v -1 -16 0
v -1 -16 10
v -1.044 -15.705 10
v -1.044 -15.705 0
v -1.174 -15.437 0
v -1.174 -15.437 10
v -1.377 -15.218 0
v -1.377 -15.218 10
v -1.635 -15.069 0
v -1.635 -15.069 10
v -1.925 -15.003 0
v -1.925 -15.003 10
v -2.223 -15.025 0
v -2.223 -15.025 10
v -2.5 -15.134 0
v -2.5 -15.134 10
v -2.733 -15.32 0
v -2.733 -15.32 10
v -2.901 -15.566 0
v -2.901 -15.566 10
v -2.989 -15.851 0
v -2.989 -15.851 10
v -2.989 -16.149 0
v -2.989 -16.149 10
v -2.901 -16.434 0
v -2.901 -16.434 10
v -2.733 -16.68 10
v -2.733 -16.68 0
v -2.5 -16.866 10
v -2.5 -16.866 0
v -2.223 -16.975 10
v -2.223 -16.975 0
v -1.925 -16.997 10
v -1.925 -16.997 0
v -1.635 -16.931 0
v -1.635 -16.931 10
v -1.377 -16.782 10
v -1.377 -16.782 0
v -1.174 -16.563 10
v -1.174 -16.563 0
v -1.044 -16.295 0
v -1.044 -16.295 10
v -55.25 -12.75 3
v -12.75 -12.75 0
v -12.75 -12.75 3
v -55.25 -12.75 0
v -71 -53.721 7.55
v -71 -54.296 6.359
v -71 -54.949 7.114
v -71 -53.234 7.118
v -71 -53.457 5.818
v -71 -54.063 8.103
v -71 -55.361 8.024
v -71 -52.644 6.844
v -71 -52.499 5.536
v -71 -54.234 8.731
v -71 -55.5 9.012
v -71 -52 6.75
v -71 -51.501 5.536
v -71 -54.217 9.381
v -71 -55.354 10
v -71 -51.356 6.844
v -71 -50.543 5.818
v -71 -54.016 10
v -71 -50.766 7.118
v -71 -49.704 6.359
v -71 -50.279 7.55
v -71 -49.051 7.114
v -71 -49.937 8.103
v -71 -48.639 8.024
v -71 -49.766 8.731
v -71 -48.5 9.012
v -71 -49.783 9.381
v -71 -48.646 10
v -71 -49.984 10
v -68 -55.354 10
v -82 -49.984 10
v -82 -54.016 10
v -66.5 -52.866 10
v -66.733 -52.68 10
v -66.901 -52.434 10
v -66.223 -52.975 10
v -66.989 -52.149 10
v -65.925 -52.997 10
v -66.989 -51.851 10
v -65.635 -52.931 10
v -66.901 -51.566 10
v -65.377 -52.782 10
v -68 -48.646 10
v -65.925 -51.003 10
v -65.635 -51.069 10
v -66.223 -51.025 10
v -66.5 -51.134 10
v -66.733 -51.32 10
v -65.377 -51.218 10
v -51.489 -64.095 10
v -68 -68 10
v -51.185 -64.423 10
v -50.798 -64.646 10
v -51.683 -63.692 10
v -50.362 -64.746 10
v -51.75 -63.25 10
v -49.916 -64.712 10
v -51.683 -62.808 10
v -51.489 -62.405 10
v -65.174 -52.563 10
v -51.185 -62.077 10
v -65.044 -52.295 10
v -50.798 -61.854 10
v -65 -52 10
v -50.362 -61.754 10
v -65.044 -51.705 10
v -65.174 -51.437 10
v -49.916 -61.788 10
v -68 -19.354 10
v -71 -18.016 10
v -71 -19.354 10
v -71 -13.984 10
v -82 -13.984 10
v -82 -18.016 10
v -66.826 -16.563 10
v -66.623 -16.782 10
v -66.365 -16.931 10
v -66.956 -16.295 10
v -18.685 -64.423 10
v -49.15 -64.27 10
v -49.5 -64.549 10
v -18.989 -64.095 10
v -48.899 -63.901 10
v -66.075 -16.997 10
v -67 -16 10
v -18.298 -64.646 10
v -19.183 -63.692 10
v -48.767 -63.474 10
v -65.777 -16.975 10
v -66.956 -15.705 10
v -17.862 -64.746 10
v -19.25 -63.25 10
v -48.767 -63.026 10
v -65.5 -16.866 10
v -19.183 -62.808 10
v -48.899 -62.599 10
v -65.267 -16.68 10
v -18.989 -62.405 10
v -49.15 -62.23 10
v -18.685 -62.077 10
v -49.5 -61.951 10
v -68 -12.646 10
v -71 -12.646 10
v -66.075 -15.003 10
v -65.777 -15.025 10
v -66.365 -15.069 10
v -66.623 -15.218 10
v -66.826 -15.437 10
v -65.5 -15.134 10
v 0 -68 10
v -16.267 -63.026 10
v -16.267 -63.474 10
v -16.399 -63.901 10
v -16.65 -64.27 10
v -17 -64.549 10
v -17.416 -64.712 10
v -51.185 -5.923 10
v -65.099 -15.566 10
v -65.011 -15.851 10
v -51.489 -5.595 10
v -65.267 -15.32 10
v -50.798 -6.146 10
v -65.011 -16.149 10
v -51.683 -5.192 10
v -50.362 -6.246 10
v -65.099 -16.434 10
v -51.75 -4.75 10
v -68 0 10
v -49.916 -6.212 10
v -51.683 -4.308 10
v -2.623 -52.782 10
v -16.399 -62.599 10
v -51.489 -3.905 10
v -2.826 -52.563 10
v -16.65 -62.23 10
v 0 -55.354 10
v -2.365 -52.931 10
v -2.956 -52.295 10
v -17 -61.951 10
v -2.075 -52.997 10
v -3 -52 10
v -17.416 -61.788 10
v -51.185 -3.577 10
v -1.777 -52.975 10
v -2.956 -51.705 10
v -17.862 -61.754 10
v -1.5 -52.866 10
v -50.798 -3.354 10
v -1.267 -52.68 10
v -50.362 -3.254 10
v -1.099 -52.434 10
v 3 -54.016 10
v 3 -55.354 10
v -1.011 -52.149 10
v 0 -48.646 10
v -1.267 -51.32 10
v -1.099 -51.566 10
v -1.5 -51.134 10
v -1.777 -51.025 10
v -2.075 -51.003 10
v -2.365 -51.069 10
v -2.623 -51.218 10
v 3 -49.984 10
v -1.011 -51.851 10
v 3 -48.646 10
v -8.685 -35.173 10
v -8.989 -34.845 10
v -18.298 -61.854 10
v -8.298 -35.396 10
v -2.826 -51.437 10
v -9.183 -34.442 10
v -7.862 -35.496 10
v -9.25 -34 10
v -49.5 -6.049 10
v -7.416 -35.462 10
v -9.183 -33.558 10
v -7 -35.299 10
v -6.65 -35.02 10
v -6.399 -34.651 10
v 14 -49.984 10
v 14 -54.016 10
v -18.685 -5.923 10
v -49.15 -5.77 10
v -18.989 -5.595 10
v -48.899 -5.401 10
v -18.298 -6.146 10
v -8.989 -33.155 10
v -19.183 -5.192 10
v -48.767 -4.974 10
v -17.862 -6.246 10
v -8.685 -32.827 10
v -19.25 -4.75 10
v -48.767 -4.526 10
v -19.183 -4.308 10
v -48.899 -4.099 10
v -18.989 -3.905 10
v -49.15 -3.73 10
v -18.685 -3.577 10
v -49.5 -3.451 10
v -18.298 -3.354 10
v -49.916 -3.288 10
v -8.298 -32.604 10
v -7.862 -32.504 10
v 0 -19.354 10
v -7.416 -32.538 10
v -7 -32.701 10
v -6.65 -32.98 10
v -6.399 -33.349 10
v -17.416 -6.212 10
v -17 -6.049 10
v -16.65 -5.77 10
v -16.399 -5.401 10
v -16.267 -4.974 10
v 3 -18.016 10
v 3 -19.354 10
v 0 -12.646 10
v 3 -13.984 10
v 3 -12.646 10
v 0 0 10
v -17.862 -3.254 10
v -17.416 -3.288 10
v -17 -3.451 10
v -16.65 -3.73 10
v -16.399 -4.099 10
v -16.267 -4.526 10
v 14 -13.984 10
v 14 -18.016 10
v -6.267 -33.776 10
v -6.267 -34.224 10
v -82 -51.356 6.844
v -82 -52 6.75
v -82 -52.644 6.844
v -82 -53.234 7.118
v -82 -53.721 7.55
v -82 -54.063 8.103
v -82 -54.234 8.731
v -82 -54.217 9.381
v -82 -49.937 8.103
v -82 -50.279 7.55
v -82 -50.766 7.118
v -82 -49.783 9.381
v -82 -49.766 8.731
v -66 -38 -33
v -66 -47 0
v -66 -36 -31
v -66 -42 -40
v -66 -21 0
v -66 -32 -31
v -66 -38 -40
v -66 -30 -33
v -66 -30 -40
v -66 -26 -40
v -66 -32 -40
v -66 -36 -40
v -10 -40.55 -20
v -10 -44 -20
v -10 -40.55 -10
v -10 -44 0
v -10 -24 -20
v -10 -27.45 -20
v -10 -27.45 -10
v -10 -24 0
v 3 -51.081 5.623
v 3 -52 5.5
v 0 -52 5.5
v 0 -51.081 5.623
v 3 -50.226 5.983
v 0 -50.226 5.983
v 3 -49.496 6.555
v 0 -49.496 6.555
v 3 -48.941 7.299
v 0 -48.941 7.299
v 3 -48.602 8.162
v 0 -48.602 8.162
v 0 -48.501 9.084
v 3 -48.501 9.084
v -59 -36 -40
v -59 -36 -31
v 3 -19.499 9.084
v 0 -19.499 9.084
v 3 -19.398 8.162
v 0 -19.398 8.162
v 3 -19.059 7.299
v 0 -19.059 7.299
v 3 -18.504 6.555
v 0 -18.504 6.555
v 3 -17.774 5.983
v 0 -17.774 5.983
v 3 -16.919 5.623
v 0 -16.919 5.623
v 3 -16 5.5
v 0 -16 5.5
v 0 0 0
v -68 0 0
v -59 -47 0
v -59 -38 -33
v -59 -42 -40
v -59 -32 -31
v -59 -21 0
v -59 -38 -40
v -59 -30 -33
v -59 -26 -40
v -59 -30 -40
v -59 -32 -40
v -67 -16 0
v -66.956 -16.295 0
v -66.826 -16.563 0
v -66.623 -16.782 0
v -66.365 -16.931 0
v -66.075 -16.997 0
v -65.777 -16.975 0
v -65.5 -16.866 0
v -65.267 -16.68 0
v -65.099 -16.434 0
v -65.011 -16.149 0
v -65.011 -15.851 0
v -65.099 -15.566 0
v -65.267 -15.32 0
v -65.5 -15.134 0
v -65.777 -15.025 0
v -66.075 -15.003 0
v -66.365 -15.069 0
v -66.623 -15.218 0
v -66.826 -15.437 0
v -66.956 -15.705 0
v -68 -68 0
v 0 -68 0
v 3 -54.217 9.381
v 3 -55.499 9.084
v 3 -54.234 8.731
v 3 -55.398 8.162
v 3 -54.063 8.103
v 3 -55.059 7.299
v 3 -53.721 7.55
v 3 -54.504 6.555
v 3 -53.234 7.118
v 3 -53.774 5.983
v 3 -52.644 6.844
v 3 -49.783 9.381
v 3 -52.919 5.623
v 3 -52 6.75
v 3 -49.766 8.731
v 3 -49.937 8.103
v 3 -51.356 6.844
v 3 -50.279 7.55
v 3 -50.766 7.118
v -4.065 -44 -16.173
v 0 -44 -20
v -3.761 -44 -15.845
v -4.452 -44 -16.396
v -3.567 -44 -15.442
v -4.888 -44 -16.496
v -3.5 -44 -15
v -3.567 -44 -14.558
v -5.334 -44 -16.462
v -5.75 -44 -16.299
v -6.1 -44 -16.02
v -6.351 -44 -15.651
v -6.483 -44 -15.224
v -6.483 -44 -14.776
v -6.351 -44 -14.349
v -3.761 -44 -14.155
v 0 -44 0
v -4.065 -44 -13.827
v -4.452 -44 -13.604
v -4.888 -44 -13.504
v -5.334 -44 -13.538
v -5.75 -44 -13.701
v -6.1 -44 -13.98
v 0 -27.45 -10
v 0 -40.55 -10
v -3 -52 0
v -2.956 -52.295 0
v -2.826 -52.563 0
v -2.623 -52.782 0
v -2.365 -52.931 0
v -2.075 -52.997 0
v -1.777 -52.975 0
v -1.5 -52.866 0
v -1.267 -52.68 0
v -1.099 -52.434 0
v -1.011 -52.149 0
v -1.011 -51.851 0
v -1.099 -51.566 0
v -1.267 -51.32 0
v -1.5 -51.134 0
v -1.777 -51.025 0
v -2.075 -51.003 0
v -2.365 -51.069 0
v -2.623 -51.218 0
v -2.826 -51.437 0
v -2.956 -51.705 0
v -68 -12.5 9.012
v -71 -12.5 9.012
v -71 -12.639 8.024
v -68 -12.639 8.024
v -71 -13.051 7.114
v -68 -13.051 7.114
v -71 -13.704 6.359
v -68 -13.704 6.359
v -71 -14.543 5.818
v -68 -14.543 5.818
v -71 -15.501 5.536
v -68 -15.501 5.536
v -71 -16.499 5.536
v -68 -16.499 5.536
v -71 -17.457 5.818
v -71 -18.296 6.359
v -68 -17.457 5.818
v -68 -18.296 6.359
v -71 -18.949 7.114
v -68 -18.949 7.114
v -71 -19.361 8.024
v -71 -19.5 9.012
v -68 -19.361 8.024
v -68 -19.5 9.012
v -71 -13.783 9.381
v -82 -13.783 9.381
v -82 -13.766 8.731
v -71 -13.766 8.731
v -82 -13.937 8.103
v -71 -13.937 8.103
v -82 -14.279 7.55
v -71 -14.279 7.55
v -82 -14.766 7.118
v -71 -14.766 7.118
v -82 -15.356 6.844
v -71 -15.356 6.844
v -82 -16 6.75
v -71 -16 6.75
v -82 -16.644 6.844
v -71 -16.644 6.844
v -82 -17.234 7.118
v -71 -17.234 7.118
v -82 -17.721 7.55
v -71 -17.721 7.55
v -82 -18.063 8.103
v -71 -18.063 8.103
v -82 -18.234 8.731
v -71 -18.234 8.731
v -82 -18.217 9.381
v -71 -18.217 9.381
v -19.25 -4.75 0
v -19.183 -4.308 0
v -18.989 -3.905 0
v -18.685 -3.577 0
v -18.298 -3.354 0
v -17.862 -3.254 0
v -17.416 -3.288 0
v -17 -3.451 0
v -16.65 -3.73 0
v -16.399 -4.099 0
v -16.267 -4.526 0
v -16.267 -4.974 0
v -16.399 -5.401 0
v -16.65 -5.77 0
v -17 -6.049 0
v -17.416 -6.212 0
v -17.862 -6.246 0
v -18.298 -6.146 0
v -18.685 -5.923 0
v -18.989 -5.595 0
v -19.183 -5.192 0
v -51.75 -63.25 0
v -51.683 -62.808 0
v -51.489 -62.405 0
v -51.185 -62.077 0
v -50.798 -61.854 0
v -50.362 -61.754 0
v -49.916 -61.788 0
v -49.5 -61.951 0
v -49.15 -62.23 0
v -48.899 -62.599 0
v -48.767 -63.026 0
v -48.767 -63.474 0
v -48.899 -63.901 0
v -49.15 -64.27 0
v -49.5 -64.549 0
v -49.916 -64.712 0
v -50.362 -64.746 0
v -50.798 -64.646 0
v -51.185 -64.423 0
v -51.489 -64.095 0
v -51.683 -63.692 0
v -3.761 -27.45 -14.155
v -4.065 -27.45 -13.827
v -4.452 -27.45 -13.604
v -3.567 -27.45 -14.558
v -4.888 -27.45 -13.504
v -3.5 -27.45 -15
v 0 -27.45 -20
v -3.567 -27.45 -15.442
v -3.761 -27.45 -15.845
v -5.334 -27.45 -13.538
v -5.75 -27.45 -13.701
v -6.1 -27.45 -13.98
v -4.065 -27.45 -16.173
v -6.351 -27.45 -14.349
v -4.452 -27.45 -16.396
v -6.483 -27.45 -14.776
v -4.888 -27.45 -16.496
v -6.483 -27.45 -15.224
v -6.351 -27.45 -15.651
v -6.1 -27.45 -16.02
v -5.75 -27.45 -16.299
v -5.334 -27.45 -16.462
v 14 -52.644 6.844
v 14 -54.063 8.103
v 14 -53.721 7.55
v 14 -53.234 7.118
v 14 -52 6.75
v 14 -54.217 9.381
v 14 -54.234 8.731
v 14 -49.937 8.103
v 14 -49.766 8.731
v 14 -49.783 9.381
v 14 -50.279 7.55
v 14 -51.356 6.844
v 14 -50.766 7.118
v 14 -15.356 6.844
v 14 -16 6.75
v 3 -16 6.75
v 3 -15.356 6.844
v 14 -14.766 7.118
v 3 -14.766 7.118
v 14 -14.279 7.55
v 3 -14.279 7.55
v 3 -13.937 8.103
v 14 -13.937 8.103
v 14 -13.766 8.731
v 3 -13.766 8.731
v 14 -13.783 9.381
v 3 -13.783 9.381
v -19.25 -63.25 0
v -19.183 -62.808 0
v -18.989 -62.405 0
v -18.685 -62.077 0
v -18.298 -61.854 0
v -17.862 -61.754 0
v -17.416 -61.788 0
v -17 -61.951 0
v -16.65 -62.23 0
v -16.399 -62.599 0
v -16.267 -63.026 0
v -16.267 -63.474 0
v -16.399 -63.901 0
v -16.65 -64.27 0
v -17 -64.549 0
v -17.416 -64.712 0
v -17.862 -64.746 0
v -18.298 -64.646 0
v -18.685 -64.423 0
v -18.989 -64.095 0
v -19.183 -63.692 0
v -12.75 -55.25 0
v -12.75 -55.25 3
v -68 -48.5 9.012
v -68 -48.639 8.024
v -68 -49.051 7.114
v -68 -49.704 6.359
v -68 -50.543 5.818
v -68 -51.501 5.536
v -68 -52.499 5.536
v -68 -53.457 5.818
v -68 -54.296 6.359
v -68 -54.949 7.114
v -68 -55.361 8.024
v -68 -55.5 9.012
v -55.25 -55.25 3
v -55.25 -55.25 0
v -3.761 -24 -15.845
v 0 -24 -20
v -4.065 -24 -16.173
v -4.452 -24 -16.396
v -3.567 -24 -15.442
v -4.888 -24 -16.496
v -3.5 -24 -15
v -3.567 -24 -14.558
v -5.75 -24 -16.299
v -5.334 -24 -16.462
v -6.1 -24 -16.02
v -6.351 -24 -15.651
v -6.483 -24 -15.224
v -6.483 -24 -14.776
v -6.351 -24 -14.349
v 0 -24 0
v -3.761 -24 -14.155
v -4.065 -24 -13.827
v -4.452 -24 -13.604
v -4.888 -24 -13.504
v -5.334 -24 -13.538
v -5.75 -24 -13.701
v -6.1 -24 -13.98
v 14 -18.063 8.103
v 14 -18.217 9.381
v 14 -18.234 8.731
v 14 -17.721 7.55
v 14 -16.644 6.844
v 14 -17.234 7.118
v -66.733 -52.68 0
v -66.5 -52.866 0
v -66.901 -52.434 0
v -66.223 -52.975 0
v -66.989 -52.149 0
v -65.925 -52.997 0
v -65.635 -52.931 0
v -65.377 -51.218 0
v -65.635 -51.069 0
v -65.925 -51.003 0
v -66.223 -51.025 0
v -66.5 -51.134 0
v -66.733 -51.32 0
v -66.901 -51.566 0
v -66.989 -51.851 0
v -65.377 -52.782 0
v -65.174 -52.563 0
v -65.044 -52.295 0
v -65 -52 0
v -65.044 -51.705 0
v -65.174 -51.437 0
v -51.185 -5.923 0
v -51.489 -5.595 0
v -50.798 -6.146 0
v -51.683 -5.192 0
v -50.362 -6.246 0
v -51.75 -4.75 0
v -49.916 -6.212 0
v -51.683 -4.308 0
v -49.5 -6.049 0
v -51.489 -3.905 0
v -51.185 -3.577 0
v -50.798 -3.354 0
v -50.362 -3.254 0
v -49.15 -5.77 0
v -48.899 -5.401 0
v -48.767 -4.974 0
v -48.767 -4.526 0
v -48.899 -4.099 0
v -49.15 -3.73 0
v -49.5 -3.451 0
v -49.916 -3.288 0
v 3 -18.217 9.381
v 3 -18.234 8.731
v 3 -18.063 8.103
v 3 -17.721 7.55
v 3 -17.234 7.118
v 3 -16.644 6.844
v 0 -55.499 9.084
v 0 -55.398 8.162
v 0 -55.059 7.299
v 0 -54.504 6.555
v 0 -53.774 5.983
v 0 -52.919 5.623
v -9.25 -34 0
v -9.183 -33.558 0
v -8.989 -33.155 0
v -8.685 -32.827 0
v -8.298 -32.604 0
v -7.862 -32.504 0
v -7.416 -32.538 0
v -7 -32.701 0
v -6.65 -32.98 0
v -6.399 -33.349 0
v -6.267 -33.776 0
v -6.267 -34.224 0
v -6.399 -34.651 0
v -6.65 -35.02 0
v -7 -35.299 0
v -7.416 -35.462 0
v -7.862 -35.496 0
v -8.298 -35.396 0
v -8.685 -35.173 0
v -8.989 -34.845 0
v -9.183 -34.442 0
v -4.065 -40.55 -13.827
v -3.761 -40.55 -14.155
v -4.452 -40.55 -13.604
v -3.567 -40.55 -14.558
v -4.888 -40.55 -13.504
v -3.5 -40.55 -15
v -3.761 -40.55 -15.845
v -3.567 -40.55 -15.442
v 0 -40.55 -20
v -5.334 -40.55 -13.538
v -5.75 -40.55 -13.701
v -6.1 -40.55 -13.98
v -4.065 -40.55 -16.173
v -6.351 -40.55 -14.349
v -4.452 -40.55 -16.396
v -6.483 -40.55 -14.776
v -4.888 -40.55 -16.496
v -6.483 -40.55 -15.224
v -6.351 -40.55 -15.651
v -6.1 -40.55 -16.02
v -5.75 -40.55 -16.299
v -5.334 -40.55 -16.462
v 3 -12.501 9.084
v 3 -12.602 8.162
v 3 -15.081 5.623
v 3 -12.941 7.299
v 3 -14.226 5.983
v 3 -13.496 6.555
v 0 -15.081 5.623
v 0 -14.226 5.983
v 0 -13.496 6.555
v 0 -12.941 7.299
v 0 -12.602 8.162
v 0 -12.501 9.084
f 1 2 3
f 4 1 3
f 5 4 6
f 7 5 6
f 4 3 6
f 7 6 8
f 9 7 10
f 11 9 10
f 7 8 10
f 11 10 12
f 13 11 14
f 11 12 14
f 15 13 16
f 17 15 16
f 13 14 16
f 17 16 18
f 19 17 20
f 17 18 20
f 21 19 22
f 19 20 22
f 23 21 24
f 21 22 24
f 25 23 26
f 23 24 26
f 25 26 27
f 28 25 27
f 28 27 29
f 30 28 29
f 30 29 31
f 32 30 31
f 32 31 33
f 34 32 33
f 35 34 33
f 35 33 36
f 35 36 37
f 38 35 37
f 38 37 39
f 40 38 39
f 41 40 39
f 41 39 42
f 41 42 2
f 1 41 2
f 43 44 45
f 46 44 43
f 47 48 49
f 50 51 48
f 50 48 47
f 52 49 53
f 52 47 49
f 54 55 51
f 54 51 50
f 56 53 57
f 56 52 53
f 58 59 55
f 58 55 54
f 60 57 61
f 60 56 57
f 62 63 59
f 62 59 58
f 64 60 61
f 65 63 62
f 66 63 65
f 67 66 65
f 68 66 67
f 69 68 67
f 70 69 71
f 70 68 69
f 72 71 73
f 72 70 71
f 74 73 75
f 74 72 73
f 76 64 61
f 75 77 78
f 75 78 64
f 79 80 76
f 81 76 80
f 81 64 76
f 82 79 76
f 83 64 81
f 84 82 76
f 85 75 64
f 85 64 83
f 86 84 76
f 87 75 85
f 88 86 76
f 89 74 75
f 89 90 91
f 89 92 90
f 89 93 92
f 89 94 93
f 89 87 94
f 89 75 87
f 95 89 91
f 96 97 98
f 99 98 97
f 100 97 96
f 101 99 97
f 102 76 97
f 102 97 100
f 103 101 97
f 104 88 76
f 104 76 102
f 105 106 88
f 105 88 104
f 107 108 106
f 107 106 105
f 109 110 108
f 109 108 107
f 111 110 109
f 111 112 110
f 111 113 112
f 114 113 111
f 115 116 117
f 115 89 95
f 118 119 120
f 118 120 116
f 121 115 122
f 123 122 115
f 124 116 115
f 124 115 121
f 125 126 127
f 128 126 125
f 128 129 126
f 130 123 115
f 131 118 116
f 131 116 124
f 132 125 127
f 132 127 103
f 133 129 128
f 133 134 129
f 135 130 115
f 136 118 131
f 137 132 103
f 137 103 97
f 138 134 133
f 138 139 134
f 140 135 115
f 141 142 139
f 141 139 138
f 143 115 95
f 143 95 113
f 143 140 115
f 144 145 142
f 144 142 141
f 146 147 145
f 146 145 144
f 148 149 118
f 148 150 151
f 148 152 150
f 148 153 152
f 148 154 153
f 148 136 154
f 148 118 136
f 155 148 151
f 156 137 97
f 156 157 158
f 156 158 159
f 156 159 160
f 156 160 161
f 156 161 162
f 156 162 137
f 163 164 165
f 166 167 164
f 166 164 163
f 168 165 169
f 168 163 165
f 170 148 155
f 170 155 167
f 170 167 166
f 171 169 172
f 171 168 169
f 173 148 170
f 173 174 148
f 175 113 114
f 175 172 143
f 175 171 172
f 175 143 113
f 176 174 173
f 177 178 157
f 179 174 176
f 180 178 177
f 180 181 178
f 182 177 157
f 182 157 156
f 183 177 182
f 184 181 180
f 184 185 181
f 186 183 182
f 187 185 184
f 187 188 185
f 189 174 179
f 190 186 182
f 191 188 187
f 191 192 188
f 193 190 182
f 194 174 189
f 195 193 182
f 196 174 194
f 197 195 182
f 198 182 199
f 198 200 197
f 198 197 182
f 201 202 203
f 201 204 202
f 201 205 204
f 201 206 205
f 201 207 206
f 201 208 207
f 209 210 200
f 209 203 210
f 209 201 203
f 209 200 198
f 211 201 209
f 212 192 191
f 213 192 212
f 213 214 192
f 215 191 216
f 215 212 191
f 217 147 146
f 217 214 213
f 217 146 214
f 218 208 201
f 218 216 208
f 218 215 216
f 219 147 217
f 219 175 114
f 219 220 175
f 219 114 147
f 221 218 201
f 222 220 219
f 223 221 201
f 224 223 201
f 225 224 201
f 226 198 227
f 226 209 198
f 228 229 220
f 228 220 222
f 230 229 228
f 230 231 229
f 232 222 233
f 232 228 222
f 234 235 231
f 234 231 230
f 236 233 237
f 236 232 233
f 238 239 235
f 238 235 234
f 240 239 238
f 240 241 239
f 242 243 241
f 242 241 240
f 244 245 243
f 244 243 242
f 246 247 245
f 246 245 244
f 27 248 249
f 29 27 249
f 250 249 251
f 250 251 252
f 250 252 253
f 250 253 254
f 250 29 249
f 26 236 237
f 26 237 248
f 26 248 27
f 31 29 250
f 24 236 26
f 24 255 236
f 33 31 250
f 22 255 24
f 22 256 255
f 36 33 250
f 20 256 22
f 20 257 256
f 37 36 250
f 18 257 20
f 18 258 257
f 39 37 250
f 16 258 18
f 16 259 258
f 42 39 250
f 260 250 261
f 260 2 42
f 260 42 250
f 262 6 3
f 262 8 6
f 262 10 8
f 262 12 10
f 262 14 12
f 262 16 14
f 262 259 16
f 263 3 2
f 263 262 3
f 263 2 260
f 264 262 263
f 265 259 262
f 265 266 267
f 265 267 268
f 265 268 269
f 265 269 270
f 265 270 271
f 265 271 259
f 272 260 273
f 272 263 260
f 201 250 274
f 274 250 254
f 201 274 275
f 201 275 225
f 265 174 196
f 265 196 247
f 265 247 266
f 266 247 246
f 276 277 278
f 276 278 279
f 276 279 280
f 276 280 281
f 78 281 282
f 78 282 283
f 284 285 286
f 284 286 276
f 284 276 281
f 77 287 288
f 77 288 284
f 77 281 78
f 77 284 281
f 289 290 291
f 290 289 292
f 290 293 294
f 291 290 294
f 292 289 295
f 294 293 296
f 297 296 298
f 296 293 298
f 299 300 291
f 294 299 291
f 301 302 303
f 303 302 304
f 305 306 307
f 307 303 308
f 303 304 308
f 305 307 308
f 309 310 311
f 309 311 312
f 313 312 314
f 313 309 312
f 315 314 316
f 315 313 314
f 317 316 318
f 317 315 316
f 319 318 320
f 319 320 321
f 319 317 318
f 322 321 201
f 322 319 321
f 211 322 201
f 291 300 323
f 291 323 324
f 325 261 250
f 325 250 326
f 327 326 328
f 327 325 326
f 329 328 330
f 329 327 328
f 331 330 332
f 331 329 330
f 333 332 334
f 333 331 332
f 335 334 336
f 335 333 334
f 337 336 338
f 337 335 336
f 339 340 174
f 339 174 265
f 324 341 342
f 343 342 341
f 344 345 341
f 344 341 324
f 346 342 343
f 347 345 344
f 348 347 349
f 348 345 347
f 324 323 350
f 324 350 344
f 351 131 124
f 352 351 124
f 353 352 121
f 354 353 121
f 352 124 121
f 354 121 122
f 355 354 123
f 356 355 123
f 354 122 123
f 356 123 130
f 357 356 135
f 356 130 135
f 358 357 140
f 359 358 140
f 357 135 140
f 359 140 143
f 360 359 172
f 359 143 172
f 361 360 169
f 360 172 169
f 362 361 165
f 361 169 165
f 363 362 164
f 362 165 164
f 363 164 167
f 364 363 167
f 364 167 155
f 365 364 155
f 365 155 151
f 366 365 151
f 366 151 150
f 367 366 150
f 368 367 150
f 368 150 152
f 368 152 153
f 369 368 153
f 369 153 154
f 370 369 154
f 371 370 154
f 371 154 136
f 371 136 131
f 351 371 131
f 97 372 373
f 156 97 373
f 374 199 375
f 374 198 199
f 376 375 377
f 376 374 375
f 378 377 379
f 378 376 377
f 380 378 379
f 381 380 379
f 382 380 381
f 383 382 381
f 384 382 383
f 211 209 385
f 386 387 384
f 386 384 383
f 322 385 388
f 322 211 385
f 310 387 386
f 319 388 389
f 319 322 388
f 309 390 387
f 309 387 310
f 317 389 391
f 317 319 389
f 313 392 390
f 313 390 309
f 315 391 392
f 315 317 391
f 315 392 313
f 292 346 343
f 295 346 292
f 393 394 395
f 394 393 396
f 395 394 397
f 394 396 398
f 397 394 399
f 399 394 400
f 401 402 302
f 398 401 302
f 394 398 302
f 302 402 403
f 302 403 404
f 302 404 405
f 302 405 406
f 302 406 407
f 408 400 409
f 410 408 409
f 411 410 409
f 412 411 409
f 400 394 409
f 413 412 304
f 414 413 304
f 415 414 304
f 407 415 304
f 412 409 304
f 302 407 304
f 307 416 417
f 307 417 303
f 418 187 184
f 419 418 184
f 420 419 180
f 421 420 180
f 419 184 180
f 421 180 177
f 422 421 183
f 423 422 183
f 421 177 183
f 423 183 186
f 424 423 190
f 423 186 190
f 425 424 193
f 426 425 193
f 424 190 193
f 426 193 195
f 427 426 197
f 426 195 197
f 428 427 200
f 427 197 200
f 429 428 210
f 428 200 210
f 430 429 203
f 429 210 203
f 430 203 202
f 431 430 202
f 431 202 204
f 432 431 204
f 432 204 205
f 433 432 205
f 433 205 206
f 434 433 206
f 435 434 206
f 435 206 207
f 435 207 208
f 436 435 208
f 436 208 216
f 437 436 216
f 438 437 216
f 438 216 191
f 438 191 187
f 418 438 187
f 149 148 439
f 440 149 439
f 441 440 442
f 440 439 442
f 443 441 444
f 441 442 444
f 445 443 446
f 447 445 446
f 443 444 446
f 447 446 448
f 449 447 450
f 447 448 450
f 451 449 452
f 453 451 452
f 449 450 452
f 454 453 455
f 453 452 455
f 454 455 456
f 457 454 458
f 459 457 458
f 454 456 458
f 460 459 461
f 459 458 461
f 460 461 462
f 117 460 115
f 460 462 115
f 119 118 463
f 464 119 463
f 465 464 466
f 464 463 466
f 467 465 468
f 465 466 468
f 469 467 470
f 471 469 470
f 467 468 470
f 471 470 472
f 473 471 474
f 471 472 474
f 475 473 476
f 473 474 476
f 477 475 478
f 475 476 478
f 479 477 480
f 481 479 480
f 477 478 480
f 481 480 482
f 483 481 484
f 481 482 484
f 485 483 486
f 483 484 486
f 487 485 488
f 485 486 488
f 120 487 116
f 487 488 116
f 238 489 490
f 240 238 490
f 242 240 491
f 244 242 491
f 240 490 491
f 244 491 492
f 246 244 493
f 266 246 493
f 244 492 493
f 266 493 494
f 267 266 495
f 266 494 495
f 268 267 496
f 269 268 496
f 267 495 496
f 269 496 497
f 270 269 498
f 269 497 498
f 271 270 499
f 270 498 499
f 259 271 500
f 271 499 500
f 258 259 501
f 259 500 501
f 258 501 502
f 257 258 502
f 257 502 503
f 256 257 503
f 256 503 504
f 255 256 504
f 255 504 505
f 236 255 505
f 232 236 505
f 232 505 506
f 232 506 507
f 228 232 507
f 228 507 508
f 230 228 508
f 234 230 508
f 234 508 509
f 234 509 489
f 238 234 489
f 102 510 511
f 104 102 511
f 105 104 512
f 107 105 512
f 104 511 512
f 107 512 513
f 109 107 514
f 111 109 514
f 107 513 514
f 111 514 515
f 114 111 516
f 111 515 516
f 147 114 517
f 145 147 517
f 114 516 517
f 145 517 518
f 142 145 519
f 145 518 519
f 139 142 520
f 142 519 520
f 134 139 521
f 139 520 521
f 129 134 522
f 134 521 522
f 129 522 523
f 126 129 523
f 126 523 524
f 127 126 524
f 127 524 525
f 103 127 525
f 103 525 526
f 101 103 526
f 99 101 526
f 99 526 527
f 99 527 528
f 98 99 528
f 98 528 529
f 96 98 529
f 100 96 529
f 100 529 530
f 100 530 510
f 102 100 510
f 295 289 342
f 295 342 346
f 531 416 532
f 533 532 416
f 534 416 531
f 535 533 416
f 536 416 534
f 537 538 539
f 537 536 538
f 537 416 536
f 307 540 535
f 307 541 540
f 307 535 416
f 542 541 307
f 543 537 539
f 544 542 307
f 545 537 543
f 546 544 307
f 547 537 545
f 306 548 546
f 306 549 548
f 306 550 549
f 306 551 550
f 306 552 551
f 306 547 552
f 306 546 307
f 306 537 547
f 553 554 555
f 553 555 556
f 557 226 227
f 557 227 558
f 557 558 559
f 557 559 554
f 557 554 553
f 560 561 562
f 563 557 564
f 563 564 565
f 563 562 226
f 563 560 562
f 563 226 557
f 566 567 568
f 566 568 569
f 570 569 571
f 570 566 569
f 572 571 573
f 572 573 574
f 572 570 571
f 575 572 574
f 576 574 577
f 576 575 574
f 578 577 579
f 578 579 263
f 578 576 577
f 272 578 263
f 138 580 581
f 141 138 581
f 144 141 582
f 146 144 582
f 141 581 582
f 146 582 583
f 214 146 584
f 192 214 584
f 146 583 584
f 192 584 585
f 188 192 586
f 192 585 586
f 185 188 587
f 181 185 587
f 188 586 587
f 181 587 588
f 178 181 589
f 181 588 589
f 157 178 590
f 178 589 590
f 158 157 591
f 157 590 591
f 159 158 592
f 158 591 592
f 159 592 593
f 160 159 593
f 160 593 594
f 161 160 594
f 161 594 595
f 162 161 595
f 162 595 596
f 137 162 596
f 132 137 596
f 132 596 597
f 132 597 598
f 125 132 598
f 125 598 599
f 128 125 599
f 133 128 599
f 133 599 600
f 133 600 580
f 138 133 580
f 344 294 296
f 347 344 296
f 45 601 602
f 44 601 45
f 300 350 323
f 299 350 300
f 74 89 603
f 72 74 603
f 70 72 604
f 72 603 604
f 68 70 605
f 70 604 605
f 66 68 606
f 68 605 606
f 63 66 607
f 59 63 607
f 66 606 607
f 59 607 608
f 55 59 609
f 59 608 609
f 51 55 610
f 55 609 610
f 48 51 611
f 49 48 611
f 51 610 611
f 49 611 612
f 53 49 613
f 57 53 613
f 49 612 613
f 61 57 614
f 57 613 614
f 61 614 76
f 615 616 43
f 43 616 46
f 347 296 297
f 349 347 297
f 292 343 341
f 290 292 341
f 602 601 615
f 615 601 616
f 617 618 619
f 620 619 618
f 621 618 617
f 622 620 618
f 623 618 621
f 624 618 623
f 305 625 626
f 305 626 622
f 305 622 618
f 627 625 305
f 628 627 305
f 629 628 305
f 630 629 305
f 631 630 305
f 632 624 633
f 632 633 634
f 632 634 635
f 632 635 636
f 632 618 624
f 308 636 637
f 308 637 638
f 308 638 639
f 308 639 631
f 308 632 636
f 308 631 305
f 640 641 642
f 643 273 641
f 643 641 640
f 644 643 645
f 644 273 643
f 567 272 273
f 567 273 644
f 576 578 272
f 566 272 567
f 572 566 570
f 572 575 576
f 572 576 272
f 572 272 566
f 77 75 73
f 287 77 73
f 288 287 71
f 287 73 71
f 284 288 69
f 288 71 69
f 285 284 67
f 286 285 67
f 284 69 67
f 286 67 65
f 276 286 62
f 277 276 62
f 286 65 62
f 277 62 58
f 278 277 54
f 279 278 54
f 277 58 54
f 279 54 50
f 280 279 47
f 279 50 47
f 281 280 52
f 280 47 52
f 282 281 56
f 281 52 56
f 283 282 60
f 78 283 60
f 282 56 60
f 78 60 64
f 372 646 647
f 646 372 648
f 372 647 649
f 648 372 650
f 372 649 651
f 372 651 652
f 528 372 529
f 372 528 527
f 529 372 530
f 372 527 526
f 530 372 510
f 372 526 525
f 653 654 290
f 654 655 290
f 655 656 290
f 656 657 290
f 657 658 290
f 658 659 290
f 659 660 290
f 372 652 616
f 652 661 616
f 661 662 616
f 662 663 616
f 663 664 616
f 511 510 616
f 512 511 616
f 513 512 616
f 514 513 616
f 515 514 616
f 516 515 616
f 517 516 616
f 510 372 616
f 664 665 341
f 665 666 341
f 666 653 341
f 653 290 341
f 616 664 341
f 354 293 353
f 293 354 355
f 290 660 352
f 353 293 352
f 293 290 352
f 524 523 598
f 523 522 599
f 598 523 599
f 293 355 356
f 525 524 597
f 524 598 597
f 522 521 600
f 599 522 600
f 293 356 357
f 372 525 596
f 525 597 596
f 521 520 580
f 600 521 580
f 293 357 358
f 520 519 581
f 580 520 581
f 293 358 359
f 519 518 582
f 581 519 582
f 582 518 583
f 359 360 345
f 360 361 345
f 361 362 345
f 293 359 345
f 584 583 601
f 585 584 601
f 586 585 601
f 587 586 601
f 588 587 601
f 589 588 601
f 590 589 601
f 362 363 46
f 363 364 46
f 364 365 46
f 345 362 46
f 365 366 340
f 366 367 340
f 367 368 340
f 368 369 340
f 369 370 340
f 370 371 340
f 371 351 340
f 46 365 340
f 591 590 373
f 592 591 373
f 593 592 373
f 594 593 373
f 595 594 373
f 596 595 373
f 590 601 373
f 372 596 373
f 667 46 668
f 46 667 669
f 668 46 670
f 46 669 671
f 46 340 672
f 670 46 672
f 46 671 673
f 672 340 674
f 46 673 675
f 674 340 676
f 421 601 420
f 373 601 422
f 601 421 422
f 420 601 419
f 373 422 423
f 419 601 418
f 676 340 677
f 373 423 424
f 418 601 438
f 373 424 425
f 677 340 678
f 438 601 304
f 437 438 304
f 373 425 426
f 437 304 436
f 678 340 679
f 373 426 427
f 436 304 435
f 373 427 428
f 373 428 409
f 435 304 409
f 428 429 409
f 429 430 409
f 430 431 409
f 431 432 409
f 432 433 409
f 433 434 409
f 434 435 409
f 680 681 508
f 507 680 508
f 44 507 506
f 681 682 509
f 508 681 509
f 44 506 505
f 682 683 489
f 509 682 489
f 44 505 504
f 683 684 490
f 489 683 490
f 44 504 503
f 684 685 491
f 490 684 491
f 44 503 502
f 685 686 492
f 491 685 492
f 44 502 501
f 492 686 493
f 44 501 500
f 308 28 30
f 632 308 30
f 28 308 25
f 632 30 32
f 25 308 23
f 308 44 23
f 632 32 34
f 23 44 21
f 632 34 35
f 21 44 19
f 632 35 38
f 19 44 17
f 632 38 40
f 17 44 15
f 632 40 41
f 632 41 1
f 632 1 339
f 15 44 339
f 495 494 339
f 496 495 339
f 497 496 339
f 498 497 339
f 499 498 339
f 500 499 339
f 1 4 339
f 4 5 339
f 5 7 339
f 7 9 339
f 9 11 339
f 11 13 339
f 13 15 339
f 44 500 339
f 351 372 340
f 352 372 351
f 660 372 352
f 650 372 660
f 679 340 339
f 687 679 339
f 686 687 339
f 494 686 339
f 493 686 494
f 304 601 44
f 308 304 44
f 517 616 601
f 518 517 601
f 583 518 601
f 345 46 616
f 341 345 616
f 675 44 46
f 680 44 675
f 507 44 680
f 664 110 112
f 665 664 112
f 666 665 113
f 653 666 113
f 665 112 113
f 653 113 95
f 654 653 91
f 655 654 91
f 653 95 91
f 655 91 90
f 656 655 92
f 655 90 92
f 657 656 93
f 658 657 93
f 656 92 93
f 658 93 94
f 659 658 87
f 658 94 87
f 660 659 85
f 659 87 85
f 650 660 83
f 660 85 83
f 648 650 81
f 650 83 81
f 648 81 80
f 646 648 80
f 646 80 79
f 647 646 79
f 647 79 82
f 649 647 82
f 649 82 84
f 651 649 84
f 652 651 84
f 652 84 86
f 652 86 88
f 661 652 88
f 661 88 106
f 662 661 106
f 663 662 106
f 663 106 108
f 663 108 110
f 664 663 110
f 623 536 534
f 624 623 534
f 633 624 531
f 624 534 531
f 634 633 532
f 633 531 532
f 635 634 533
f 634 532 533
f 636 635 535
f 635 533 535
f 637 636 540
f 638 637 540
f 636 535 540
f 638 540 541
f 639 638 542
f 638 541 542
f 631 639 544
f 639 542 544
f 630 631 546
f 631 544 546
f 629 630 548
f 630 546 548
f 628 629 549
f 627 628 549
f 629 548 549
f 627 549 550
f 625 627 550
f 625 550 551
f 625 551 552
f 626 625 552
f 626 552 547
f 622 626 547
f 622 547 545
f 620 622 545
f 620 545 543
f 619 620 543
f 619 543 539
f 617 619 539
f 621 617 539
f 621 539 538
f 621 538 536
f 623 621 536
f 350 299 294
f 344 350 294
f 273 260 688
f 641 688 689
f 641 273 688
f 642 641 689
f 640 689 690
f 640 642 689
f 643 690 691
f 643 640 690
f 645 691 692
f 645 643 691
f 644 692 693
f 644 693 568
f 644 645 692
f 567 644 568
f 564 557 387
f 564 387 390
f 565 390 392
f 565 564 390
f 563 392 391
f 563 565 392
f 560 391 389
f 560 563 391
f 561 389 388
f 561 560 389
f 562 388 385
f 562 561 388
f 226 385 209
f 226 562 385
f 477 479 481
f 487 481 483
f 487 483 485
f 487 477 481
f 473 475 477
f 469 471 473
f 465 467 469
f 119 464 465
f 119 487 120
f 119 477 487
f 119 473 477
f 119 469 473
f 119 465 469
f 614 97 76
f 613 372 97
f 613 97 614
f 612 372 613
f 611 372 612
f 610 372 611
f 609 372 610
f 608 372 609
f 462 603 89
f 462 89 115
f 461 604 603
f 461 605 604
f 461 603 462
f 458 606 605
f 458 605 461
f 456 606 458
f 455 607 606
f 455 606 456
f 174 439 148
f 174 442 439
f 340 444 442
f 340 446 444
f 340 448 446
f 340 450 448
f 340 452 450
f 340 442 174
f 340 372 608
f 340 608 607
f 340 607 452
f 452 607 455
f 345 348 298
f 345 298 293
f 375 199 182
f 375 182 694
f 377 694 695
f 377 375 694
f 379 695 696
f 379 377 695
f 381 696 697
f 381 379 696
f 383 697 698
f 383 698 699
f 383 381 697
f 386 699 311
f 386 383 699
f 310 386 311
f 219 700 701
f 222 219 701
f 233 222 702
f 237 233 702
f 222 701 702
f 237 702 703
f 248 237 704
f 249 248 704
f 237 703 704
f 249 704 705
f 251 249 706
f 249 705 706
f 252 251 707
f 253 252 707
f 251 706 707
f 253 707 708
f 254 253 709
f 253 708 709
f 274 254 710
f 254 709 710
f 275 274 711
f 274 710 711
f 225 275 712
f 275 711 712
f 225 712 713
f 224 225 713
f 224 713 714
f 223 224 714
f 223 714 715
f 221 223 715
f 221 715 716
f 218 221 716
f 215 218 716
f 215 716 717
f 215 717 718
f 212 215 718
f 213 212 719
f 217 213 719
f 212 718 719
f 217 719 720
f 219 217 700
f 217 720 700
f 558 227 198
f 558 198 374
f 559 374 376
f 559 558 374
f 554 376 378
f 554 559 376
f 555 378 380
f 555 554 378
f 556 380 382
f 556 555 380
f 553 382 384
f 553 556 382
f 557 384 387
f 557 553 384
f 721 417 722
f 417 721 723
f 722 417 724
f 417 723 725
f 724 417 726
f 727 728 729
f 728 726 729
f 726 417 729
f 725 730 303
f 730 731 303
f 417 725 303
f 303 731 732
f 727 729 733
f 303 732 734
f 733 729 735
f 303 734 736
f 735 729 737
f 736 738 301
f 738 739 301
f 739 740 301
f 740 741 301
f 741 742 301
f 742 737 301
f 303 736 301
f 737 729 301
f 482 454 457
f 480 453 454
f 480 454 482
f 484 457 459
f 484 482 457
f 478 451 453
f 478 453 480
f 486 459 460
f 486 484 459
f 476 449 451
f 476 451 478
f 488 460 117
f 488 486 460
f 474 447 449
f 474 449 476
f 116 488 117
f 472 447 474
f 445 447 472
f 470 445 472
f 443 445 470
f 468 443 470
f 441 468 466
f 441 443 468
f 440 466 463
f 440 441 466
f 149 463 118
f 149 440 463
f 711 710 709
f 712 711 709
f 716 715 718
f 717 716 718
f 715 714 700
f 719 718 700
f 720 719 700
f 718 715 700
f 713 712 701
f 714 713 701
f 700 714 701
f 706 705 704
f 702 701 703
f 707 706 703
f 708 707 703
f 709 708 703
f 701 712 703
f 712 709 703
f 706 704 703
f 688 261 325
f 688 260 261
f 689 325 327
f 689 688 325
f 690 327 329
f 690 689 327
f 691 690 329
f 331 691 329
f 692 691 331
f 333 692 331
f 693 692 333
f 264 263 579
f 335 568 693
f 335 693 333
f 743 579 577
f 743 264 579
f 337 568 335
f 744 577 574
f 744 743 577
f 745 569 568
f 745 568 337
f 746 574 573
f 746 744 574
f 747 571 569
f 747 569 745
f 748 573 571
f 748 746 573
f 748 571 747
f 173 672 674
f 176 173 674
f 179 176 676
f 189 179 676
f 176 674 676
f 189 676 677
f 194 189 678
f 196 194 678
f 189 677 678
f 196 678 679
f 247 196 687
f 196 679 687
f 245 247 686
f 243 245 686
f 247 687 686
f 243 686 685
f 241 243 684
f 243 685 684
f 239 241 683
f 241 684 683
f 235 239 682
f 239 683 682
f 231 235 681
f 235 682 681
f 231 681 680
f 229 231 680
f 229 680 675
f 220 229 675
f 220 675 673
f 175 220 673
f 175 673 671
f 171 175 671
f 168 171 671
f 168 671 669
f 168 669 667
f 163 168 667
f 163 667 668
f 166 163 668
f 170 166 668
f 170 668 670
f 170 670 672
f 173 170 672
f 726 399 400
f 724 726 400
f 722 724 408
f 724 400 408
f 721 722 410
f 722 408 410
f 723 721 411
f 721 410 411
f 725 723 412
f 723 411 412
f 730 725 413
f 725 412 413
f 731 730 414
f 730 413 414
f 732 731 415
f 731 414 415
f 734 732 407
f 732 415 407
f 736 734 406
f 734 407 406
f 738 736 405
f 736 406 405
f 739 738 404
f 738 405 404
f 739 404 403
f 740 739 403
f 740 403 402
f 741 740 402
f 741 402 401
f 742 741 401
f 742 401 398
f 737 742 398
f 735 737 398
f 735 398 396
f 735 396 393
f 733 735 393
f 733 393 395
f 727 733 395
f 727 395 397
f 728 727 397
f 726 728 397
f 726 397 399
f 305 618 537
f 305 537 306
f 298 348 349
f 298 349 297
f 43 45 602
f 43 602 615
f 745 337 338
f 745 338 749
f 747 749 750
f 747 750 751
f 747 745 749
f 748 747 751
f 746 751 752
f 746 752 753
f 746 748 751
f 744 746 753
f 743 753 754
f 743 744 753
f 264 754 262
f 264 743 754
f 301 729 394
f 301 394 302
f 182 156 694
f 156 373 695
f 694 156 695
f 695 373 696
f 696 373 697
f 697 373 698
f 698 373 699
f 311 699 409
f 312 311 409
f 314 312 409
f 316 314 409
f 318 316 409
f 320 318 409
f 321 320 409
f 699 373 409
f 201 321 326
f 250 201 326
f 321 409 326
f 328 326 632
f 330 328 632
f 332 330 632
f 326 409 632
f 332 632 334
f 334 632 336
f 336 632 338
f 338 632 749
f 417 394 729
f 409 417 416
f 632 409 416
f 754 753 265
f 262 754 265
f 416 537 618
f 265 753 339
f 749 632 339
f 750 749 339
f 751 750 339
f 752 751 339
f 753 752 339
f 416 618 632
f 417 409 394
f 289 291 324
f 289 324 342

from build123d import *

# Parameters (mm, degrees)
SKETCH1_W           = 68
SKETCH1_H           = 68
BOSS_EXTRUDE1_DEPTH = 10
BOSS_EXTRUDE2_DEPTH = 3
BOSS_EXTRUDE3_DEPTH = 11
BOSS_EXTRUDE4_START = 3
BOSS_EXTRUDE4_DEPTH = 3
BOSS_EXTRUDE5_START = 11
BOSS_EXTRUDE5_DEPTH = 11
SKETCH6_W           = 42.5
SKETCH6_H           = 42.5
CUT_EXTRUDE1_DEPTH  = 3
SKETCH8_R           = 1.5
CUT_EXTRUDE2_DEPTH  = 15
SKETCH9_W           = 10
SKETCH9_H           = 20
BOSS_EXTRUDE6_DEPTH = 20
SKETCH10_R          = 1.5
CUT_EXTRUDE3_DEPTH  = 10
SKETCH11_R          = 1
CUT_EXTRUDE4_DEPTH  = 20
SKETCH13_W          = 7
SKETCH13_H          = 16
BOSS_EXTRUDE7_DEPTH = 40
CUT_EXTRUDE5_DEPTH  = 10
BOSS_EXTRUDE8_START = -7
BOSS_EXTRUDE8_DEPTH = 7
SKETCH17_W          = 10
SKETCH17_H          = 13.1
CUT_EXTRUDE6_DEPTH  = 10
SKETCH18_R          = 1.5
CUT_EXTRUDE7_DEPTH  = 30


with BuildPart() as part:
    # Sketch1 → Boss-Extrude1 (new body)
    with BuildSketch(Plane.XY):
        with Locations((-34, -34)):
            Rectangle(SKETCH1_W, SKETCH1_H)
    extrude(amount=BOSS_EXTRUDE1_DEPTH)

    # Sketch2 → Boss-Extrude2 (add)
    with BuildSketch(Plane.ZY.offset(68)):
        with BuildLine():
            Line((10, -19.354101966), (10, -12.645898034))
            ThreePointArc((10, -12.645898034), (5.5, -16), (10, -19.354101966))
        make_face()
        with BuildLine():
            Line((10, -55.354101966), (10, -48.645898034))
            ThreePointArc((10, -48.645898034), (5.5, -52), (10, -55.354101966))
        make_face()
    extrude(amount=BOSS_EXTRUDE2_DEPTH)

    # Sketch3 → Boss-Extrude3 (add)
    with BuildSketch(Plane.ZY.offset(71)):
        with BuildLine():
            ThreePointArc((10, -49.984435563), (6.75, -52), (10, -54.015564437))
            Line((10, -54.015564437), (10, -49.984435563))
        make_face()
        with BuildLine():
            ThreePointArc((10, -13.984435563), (6.75, -16), (10, -18.015564437))
            Line((10, -18.015564437), (10, -13.984435563))
        make_face()
    extrude(amount=BOSS_EXTRUDE3_DEPTH)

    # Sketch4 → Boss-Extrude4 (add)
    with BuildSketch(Plane(origin=(0, 0, 0), x_dir=(0, 0, -1), z_dir=(1, 0, 0)).offset(BOSS_EXTRUDE4_START)):
        with BuildLine():
            ThreePointArc((-5.5, -16), (-6.908349934, -13.19375696), (-10, -12.645898034))
            Line((-10, -12.645898034), (-10, -19.354101966))
            ThreePointArc((-10, -19.354101966), (-6.908349934, -18.80624304), (-5.5, -16))
        make_face()
        with BuildLine():
            ThreePointArc((-5.5, -52), (-6.908349934, -49.19375696), (-10, -48.645898034))
            Line((-10, -48.645898034), (-10, -55.354101966))
            ThreePointArc((-10, -55.354101966), (-6.908349934, -54.80624304), (-5.5, -52))
        make_face()
    extrude(amount=-BOSS_EXTRUDE4_DEPTH)

    # Sketch5 → Boss-Extrude5 (add)
    with BuildSketch(Plane(origin=(3, 0, 0), x_dir=(0, 0, -1), z_dir=(1, 0, 0)).offset(BOSS_EXTRUDE5_START)):
        with BuildLine():
            ThreePointArc((-6.75, -16), (-7.814145877, -14.087867682), (-10, -13.984435563))
            Line((-10, -13.984435563), (-10, -18.015564437))
            ThreePointArc((-10, -18.015564437), (-7.814145877, -17.912132318), (-6.75, -16))
        make_face()
        with BuildLine():
            ThreePointArc((-6.75, -52), (-7.814145877, -50.087867682), (-10, -49.984435563))
            Line((-10, -49.984435563), (-10, -54.015564437))
            ThreePointArc((-10, -54.015564437), (-7.814145877, -53.912132318), (-6.75, -52))
        make_face()
    extrude(amount=-BOSS_EXTRUDE5_DEPTH)

    # Sketch6 → Cut-Extrude1 (cut)
    with BuildSketch(Plane(origin=(0, 0, 0), x_dir=(-1, 0, 0), z_dir=(0, 0, -1))):
        with Locations((34, -34)):
            Rectangle(SKETCH6_W, SKETCH6_H)
    extrude(amount=-CUT_EXTRUDE1_DEPTH, mode=Mode.SUBTRACT)

    # Sketch8 → Cut-Extrude2 (cut)
    with BuildSketch(Plane(origin=(0, 0, 0), x_dir=(-1, 0, 0), z_dir=(0, 0, -1))):
        with Locations((17.75, -4.75)):
            Circle(SKETCH8_R)
        with Locations((50.25, -4.75)):
            Circle(SKETCH8_R)
        with Locations((50.25, -63.25)):
            Circle(SKETCH8_R)
        with Locations((17.75, -63.25)):
            Circle(SKETCH8_R)
    extrude(amount=-CUT_EXTRUDE2_DEPTH, mode=Mode.SUBTRACT)

    # Sketch9 → Boss-Extrude6 (add)
    with BuildSketch(Plane(origin=(0, 0, 0), x_dir=(-1, 0, 0), z_dir=(0, 0, -1))):
        with Locations((5, -34)):
            Rectangle(SKETCH9_W, SKETCH9_H)
    extrude(amount=BOSS_EXTRUDE6_DEPTH)

    # Sketch10 → Cut-Extrude3 (cut)
    with BuildSketch(Plane(origin=(0, 0, 0), x_dir=(-1, 0, 0), z_dir=(0, 0, -1))):
        with Locations((7.75, -34)):
            Circle(SKETCH10_R)
        with Locations((7.75, -78)):
            Circle(SKETCH10_R)
    extrude(amount=-CUT_EXTRUDE3_DEPTH, mode=Mode.SUBTRACT)

    # Sketch11 → Cut-Extrude4 (cut)
    with BuildSketch(Plane.XY.offset(10)):
        with Locations((-66, -52)):
            Circle(SKETCH11_R)
        with Locations(Location((-66, -16, 0), (0, 0, 180))):
            Circle(SKETCH11_R)
        with Locations(Location((-2, -52, 0), (0, 0, 180))):
            Circle(SKETCH11_R)
        with Locations((-2, -16)):
            Circle(SKETCH11_R)
    extrude(amount=-CUT_EXTRUDE4_DEPTH, mode=Mode.SUBTRACT)

    # Sketch13 → Boss-Extrude7 (add)
    with BuildSketch(Plane(origin=(0, 0, 0), x_dir=(-1, 0, 0), z_dir=(0, 0, -1))):
        with Locations((62.5, -34)):
            Rectangle(SKETCH13_W, SKETCH13_H)
    extrude(amount=BOSS_EXTRUDE7_DEPTH)

    # Sketch15 → Cut-Extrude5 (cut)
    with BuildSketch(Plane.ZY.offset(66)):
        Polygon((-40, -32), (-31, -32), (-33, -30), (-40, -30), align=None)
        Polygon((-40, -38), (-40, -36), (-31, -36), (-33, -38), align=None)
    extrude(amount=-CUT_EXTRUDE5_DEPTH, mode=Mode.SUBTRACT)

    # Sketch16 → Boss-Extrude8 (add)
    with BuildSketch(Plane.ZY.offset(66).offset(BOSS_EXTRUDE8_START)):
        Polygon((0, -26), (-40, -26), (0, -21), align=None)
        Polygon((-40, -42), (0, -47), (0, -42), align=None)
    extrude(amount=BOSS_EXTRUDE8_DEPTH)

    # Sketch17 → Cut-Extrude6 (cut)
    with BuildSketch(Plane(origin=(0, 0, -20), x_dir=(-1, 0, 0), z_dir=(0, 0, -1))):
        with Locations((5, -34)):
            Rectangle(SKETCH17_W, SKETCH17_H)
    extrude(amount=-CUT_EXTRUDE6_DEPTH, mode=Mode.SUBTRACT)

    # Sketch18 → Cut-Extrude7 (cut)
    with BuildSketch(Plane(origin=(0, -44, 0), x_dir=(-1, 0, 0), z_dir=(0, -1, 0))):
        with Locations(Location((5, 15, 0), (0, 0, 180))):
            Circle(SKETCH18_R)
    extrude(amount=-CUT_EXTRUDE7_DEPTH, mode=Mode.SUBTRACT)


solid = part.part
